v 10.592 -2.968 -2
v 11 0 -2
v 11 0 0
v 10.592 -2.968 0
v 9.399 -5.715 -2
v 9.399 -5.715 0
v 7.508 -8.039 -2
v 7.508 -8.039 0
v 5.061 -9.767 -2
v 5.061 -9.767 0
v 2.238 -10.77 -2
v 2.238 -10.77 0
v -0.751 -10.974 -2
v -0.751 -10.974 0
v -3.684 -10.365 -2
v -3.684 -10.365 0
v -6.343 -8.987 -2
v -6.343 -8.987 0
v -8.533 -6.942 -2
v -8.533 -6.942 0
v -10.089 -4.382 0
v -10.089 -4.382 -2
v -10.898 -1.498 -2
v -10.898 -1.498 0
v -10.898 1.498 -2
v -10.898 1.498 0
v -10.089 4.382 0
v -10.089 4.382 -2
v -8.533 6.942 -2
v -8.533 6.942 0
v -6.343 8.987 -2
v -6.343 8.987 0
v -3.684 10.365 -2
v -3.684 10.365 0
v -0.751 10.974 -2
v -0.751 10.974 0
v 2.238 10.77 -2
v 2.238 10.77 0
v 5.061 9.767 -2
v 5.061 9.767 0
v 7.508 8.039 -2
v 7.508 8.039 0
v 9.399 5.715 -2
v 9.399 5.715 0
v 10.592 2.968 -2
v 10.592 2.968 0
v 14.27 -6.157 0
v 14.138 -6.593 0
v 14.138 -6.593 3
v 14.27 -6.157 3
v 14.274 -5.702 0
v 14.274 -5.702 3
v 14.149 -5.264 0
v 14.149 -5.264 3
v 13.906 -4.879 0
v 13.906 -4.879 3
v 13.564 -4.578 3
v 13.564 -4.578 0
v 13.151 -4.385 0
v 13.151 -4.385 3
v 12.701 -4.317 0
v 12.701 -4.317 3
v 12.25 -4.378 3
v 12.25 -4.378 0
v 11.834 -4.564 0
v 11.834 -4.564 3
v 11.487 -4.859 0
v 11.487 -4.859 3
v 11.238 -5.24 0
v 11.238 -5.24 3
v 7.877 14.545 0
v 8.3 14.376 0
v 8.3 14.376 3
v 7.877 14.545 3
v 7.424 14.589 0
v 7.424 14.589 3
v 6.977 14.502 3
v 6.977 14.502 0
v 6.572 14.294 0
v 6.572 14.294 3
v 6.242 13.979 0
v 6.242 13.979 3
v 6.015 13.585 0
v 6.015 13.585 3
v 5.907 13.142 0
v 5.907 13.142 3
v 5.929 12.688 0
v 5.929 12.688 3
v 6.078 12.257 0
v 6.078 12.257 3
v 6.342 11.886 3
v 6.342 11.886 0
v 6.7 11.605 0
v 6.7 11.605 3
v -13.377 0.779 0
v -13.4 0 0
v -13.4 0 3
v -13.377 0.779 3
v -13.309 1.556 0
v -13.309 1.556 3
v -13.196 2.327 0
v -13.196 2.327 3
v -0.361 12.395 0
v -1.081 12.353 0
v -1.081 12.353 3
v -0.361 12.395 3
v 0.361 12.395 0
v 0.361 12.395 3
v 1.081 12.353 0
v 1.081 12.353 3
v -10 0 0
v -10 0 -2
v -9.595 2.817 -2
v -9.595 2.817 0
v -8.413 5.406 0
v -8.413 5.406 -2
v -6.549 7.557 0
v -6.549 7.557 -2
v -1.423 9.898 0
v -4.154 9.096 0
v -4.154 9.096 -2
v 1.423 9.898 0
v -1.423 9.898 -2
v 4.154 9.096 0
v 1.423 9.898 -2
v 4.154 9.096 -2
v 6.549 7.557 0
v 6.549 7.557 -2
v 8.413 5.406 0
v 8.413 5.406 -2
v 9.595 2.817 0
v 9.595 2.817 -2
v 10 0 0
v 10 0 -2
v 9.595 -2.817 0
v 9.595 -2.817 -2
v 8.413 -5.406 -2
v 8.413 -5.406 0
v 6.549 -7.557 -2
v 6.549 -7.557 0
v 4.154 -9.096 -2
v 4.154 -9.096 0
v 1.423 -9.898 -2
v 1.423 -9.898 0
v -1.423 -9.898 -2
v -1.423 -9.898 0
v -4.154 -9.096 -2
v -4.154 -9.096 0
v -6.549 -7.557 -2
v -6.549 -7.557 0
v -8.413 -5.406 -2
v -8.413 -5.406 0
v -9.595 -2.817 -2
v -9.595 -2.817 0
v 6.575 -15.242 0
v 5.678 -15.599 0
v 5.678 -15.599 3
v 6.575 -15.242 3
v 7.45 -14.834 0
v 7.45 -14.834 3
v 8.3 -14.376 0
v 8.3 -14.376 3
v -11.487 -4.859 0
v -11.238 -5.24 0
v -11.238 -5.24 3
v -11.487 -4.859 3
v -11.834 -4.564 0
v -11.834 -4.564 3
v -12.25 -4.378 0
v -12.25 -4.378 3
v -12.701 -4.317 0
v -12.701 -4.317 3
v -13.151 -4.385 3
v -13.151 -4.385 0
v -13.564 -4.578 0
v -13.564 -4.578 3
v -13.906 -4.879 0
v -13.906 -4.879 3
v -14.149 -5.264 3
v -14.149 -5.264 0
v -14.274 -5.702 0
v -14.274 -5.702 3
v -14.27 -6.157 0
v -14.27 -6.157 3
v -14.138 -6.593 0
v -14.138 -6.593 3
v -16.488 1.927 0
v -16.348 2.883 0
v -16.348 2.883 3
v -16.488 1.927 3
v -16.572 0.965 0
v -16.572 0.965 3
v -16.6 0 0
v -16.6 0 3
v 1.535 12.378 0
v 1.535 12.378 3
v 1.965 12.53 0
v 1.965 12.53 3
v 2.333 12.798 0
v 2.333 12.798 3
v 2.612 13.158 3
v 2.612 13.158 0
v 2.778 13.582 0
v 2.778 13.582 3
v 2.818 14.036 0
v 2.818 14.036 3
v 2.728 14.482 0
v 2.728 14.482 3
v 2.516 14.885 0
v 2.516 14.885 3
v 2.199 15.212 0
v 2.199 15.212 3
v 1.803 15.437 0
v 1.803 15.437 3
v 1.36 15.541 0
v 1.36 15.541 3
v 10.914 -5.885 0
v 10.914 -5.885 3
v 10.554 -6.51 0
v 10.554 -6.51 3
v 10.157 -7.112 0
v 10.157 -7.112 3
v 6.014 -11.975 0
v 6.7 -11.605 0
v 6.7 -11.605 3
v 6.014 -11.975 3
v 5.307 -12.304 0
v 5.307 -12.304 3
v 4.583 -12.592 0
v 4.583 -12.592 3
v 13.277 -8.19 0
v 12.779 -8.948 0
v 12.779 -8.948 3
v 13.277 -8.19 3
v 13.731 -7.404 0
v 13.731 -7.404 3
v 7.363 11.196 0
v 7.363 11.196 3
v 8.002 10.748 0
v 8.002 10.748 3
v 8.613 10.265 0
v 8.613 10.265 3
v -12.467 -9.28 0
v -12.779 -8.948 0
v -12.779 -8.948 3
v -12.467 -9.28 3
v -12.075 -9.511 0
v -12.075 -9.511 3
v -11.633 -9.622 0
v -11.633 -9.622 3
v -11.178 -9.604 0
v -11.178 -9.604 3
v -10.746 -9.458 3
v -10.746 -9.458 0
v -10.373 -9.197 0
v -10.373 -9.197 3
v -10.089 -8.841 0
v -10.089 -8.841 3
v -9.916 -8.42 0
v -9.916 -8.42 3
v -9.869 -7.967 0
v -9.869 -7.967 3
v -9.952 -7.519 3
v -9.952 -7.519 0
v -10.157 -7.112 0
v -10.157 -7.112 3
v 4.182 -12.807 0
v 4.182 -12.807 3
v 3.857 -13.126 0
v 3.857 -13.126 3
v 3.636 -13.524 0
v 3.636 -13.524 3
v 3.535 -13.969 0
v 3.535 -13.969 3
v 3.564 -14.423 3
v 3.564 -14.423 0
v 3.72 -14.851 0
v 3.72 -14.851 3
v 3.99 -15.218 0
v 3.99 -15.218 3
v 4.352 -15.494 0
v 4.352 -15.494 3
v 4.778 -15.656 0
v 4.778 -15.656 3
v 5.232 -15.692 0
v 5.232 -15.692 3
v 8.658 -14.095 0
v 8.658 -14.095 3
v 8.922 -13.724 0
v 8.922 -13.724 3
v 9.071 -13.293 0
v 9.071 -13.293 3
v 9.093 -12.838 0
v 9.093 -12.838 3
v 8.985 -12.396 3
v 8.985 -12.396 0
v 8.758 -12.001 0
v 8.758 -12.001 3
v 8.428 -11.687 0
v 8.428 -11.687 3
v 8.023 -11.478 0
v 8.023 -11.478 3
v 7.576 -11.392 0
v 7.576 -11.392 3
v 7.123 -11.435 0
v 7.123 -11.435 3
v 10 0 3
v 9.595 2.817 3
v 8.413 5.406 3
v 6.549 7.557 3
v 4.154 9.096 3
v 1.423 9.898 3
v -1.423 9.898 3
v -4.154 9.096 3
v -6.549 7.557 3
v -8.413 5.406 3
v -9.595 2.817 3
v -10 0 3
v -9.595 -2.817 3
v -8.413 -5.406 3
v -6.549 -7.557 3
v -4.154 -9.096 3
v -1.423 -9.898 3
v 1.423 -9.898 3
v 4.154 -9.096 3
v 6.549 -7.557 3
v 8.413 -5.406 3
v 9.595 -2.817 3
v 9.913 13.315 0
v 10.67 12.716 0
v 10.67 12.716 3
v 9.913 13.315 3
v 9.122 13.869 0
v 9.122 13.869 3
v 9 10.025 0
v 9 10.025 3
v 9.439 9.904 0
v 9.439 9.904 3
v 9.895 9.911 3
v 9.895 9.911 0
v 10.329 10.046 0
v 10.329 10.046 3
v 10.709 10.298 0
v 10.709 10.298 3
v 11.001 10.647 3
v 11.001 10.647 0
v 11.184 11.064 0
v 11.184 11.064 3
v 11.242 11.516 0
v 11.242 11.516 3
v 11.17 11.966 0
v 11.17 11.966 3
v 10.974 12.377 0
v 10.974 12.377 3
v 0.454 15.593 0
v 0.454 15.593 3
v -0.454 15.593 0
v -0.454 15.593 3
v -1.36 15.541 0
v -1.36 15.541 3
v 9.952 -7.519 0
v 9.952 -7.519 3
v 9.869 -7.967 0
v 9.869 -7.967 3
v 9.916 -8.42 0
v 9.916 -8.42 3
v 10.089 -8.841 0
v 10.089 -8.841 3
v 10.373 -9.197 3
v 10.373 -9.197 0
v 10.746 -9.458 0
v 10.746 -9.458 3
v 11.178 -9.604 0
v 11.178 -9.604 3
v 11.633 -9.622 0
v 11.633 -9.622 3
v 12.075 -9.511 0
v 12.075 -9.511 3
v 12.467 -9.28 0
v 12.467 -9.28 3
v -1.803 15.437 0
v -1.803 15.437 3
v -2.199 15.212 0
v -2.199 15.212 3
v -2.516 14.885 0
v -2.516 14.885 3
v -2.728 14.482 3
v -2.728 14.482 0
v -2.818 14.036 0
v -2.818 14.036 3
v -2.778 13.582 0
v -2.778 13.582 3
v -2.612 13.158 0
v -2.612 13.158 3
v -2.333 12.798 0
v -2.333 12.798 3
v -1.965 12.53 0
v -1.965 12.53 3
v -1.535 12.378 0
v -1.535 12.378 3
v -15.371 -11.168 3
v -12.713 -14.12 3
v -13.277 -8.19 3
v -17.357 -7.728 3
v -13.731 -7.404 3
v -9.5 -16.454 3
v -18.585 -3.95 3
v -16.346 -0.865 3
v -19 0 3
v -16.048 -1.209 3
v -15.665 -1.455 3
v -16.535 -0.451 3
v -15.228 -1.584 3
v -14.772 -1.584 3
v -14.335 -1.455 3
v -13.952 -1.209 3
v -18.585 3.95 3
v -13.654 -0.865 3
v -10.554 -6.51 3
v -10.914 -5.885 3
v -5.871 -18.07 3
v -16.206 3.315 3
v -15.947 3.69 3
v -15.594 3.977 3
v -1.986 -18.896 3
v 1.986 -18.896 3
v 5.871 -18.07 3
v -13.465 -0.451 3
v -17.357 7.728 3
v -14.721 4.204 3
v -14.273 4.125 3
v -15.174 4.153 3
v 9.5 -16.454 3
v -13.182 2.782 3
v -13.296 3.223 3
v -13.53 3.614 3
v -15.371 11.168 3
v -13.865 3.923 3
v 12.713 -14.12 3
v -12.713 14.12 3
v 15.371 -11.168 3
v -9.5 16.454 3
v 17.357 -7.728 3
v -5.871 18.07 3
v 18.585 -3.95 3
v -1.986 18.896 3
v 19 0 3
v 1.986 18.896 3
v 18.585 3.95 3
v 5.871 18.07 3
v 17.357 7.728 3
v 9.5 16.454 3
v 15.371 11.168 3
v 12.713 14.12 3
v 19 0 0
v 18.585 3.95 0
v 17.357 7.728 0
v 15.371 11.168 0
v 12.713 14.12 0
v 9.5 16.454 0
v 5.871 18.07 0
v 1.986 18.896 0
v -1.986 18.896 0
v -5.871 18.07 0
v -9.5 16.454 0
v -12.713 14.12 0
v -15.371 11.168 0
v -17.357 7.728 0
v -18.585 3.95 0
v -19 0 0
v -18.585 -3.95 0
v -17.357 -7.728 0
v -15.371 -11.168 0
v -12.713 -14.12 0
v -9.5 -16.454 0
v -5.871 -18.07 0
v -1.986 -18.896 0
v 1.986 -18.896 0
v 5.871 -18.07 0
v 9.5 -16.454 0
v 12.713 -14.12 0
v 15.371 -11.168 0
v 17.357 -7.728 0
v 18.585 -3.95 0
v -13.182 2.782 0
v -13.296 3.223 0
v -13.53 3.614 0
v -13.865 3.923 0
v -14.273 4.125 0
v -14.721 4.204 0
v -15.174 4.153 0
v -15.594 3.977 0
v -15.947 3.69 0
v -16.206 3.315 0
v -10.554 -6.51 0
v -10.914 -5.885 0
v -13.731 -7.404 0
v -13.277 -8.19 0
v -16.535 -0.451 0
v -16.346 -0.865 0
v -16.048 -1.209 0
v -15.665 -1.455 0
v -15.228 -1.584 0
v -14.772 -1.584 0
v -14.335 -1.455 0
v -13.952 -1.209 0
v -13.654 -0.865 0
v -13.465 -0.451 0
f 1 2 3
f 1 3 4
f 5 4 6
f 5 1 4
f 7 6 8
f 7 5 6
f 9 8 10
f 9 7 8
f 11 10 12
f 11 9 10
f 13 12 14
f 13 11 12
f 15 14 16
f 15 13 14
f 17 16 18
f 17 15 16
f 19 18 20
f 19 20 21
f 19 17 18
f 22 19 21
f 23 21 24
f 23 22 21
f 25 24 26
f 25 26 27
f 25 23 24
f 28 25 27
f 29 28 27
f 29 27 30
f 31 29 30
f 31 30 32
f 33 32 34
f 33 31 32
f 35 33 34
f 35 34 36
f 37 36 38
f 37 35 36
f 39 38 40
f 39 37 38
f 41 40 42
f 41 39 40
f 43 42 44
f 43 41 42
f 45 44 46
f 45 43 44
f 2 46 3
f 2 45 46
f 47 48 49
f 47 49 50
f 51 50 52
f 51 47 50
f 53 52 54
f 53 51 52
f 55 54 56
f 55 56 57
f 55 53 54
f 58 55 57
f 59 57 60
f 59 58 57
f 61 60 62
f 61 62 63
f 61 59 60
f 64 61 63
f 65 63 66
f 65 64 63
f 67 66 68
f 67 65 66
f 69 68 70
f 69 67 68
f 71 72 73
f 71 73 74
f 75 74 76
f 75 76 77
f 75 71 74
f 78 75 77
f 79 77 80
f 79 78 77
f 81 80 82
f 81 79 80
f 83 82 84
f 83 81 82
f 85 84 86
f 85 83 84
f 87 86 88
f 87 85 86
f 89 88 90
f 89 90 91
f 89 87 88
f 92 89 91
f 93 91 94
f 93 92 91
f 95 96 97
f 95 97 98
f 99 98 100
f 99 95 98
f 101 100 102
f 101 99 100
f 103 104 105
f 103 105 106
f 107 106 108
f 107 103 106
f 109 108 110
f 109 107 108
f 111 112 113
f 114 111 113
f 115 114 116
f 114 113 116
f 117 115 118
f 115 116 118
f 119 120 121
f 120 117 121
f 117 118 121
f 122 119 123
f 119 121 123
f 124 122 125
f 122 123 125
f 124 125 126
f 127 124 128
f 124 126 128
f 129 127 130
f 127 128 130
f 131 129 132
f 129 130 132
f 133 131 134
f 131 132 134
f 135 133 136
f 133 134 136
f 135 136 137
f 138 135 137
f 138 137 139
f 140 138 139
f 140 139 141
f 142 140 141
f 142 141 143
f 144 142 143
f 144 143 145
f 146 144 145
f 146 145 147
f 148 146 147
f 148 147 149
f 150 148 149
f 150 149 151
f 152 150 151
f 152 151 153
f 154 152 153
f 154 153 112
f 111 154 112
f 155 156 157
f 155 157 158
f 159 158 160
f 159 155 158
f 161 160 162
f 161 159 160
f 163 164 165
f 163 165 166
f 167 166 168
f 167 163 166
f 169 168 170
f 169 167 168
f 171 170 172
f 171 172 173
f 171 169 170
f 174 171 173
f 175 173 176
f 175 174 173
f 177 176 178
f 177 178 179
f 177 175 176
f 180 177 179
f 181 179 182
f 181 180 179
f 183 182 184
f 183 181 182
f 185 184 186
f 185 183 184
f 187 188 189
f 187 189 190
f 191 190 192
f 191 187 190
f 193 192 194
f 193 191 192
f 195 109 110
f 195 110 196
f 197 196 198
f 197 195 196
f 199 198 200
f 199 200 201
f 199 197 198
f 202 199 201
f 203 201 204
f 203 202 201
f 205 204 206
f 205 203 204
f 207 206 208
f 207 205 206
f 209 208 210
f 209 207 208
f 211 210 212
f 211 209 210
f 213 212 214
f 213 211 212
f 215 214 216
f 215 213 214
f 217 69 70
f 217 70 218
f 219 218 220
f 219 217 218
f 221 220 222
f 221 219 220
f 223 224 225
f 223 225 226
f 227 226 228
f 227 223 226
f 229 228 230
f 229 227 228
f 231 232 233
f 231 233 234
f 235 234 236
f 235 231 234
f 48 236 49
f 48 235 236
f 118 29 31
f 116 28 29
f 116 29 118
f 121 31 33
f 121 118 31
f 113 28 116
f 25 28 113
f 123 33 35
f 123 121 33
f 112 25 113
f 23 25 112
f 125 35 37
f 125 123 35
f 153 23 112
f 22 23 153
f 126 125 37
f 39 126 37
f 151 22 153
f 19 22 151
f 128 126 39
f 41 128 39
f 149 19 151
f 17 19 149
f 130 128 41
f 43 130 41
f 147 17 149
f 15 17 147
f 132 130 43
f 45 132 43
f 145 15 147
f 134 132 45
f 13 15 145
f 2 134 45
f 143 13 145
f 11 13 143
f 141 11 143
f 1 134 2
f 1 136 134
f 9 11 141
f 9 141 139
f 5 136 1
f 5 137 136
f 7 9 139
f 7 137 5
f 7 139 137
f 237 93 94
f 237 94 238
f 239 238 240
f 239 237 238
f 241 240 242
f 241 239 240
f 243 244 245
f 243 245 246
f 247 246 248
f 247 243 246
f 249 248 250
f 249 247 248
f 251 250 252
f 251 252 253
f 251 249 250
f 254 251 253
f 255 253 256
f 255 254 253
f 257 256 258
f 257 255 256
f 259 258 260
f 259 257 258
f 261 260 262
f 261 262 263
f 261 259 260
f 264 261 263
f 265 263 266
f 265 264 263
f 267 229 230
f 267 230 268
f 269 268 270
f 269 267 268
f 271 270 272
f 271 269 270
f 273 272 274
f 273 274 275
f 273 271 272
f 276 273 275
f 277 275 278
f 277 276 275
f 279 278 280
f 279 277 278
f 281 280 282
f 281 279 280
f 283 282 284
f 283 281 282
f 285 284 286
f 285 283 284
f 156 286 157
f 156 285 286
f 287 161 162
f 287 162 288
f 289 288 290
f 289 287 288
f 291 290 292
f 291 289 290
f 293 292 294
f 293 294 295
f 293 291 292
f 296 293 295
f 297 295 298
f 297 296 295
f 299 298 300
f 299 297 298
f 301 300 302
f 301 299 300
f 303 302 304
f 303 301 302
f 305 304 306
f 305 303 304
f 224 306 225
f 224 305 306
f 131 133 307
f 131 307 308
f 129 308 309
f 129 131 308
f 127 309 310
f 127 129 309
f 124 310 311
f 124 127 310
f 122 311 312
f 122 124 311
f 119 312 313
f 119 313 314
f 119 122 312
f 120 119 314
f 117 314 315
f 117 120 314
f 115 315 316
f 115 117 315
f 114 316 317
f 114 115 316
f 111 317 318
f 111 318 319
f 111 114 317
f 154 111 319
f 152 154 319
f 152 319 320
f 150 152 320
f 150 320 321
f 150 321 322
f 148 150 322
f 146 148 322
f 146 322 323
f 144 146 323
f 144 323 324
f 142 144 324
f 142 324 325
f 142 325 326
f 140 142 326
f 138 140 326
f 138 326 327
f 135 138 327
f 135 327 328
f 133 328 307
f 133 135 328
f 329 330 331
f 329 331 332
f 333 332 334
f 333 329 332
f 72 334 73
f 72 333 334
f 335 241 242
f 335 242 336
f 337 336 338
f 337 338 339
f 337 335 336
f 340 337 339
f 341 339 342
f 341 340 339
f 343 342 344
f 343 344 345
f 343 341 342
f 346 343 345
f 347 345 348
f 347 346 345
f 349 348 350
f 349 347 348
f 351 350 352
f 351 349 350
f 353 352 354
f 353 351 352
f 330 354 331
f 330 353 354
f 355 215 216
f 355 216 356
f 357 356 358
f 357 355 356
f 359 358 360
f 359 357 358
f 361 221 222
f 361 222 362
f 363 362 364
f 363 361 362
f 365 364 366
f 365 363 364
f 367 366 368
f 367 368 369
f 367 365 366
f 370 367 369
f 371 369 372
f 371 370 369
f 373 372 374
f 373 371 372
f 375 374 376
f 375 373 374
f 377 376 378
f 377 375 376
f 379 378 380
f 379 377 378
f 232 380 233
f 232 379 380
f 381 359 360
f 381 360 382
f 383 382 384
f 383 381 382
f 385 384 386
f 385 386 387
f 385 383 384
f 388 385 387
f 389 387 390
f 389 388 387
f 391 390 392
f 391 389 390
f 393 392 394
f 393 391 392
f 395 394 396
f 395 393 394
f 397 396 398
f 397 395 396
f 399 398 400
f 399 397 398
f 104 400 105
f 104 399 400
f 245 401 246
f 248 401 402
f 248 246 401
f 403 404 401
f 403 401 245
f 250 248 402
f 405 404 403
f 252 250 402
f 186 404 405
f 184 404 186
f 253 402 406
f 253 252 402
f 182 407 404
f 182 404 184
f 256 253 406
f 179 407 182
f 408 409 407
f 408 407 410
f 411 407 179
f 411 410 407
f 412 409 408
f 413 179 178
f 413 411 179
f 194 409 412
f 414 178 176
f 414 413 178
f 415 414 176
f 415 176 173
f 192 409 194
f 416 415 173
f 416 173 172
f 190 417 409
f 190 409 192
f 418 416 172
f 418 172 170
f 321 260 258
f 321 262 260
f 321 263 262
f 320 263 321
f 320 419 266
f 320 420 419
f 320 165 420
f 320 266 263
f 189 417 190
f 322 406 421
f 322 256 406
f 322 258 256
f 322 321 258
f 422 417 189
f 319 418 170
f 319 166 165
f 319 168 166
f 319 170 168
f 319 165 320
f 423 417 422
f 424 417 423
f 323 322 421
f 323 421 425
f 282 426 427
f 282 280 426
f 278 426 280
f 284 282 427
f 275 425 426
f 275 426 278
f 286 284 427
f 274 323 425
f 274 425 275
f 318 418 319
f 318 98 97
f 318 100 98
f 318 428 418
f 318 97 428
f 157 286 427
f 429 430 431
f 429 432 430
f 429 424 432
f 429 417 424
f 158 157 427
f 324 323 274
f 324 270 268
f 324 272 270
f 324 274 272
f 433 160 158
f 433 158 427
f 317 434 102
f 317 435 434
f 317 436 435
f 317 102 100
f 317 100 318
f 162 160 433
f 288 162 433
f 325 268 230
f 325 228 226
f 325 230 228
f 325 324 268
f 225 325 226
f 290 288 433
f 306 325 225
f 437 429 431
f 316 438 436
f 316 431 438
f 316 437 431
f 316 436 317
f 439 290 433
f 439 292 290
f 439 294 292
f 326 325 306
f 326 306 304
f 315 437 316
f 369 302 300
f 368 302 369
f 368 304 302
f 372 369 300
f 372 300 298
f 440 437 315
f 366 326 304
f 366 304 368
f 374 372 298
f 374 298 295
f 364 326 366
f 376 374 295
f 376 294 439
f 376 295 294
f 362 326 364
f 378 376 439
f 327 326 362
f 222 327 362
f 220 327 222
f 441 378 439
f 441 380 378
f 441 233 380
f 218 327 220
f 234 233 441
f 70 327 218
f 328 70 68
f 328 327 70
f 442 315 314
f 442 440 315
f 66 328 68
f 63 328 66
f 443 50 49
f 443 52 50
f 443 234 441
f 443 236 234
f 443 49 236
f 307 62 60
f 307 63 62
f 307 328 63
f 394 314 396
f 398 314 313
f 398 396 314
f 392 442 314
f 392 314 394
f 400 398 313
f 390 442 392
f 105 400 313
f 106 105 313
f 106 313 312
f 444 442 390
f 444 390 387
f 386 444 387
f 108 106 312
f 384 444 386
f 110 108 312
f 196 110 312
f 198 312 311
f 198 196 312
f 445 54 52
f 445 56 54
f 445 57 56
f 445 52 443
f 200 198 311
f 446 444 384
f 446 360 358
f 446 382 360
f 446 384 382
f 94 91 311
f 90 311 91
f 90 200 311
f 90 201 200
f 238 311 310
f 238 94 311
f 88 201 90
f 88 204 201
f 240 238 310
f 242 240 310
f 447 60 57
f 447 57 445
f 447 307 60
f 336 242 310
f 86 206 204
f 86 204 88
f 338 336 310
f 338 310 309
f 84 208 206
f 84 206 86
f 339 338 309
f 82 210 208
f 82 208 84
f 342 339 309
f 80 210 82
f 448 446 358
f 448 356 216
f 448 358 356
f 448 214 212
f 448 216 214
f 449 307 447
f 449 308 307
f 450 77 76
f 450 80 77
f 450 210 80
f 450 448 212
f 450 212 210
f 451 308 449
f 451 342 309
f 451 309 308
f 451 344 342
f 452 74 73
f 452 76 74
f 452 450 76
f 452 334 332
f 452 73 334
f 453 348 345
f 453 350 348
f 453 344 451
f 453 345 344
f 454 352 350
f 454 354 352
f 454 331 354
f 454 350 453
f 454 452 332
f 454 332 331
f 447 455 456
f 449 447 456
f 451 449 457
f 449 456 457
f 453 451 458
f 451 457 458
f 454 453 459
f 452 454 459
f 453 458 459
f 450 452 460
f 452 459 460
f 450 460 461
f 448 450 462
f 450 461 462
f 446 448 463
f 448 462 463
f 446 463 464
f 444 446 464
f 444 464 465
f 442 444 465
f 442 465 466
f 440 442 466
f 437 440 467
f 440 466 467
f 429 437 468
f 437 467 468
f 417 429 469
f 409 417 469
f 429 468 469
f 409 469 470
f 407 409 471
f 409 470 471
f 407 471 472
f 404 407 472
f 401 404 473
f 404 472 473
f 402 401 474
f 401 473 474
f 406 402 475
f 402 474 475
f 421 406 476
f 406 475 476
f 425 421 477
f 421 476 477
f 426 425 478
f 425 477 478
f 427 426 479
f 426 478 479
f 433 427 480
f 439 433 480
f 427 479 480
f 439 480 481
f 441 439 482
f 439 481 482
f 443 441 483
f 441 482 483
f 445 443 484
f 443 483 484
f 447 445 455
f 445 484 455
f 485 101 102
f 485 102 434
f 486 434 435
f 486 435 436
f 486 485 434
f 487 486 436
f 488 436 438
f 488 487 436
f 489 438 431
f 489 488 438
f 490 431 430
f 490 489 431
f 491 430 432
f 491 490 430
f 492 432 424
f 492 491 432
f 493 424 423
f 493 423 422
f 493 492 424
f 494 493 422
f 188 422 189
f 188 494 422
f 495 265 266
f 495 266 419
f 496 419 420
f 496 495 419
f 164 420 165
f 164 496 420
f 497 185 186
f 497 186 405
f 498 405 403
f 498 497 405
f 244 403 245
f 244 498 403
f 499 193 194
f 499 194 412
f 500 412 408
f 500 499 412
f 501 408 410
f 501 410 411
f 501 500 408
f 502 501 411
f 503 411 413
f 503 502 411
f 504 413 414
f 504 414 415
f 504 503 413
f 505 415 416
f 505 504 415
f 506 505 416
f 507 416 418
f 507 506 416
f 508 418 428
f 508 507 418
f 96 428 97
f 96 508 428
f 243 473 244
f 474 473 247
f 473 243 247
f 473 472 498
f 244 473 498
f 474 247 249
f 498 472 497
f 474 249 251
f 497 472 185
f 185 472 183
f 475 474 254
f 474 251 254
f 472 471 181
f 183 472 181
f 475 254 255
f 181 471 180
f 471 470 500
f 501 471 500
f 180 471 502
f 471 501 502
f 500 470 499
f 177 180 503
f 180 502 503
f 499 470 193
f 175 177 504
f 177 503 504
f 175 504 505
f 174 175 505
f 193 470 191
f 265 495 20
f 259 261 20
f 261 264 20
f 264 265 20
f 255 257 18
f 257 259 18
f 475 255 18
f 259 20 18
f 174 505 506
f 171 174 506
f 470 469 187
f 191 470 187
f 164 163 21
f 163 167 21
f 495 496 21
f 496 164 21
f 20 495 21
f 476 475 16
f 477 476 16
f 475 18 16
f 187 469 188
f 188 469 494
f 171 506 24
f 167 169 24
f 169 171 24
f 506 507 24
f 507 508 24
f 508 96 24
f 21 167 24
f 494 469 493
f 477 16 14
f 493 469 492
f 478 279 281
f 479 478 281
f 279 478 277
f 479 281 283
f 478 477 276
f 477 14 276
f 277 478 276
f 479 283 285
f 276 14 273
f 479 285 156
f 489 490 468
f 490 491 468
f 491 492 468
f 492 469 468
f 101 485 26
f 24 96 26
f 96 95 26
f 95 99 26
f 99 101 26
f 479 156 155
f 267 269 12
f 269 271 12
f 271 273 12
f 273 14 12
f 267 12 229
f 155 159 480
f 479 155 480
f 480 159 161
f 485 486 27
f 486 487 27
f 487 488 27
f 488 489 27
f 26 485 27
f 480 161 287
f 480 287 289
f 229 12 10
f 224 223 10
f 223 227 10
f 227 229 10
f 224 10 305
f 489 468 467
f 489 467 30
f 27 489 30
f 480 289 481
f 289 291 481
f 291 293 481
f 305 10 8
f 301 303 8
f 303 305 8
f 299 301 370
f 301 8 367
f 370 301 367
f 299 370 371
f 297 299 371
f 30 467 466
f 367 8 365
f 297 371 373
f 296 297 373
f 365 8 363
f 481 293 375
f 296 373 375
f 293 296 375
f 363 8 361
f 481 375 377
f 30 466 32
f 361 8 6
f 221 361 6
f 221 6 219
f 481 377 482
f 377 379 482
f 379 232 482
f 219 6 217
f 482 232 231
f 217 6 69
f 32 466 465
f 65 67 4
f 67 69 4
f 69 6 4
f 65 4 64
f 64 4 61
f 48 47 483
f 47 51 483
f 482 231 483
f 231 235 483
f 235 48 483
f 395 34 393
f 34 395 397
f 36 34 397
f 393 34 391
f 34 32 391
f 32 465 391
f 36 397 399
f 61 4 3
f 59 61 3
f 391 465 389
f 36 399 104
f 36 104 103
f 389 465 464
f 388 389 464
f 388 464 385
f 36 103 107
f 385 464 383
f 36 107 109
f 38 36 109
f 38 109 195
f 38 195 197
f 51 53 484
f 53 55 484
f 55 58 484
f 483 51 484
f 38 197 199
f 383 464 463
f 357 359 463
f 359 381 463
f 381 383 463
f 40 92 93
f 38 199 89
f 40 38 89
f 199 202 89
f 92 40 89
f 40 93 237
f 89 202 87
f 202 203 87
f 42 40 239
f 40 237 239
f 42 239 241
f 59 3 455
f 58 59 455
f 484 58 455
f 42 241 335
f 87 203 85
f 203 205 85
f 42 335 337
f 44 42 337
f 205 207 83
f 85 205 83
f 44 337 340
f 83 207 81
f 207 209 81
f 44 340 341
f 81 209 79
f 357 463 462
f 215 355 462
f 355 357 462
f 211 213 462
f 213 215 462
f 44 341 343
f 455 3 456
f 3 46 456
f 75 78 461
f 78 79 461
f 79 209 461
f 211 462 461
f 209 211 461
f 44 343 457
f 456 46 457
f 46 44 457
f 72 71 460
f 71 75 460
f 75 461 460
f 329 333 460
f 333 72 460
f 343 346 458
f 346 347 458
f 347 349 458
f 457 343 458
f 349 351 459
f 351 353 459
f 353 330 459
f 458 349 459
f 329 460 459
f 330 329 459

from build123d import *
from build123d.topology import SkipClean

# Parameters (mm, degrees)
SKETCH1_R           = 19
SKETCH1_R_2         = 10
BOSS_EXTRUDE1_DEPTH = 3
BOSS_EXTRUDE2_START = 2
SKETCH2_R           = 11
SKETCH2_R_2         = 10
BOSS_EXTRUDE2_DEPTH = 2


with BuildPart() as part:
    # Sketch1 → Boss-Extrude1 (new body)
    with BuildSketch(Plane.XY):
        Circle(SKETCH1_R)
        Circle(SKETCH1_R_2, mode=Mode.SUBTRACT)
        with BuildLine():
            ThreePointArc((1.359629587, 15.54063729), (0, 15.6), (-1.359629587, 15.54063729))
            ThreePointArc((-1.359629587, 15.54063729), (-2.814091915, 13.807276585), (-1.08073121, 12.352814256))
            ThreePointArc((-1.08073121, 12.352814256), (0, 12.4), (1.08073121, 12.352814256))
            ThreePointArc((1.08073121, 12.352814256), (2.814091915, 13.807276585), (1.359629587, 15.54063729))
        make_face(mode=Mode.SUBTRACT)
        with BuildLine():
            ThreePointArc((10.670274321, 12.716337756), (9.521368843, 13.597923935), (8.3, 14.376021703))
            ThreePointArc((8.3, 14.376021703), (6.114359354, 13.790381057), (6.7, 11.604740411))
            ThreePointArc((6.7, 11.604740411), (7.685924247, 10.976637393), (8.61335397, 10.264995538))
            ThreePointArc((8.61335397, 10.264995538), (10.867485254, 10.462206471), (10.670274321, 12.716337756))
        make_face(mode=Mode.SUBTRACT)
        with BuildLine():
            ThreePointArc((12.778771891, -8.947792407), (13.509996299, -7.8), (14.138401478, -6.592844883))
            ThreePointArc((14.138401478, -6.592844883), (13.364498237, -4.466563205), (11.238216559, -5.240466446))
            ThreePointArc((11.238216559, -5.240466446), (10.738715007, -6.2), (10.157485349, -7.112347811))
            ThreePointArc((10.157485349, -7.112347811), (10.550406322, -9.34071338), (12.778771891, -8.947792407))
        make_face(mode=Mode.SUBTRACT)
        with BuildLine():
            ThreePointArc((5.677534379, -15.598897505), (7.015463145, -15.044709265), (8.3, -14.376021703))
            ThreePointArc((8.3, -14.376021703), (8.885640646, -12.190381057), (6.7, -11.604740411))
            ThreePointArc((6.7, -11.604740411), (5.663084707, -12.144524346), (4.583069921, -12.591881119))
            ThreePointArc((4.583069921, -12.591881119), (3.626793957, -14.642621541), (5.677534379, -15.598897505))
        make_face(mode=Mode.SUBTRACT)
        with BuildLine():
            ThreePointArc((-14.138401478, -6.592844883), (-13.509996299, -7.8), (-12.778771891, -8.947792407))
            ThreePointArc((-12.778771891, -8.947792407), (-10.550406322, -9.34071338), (-10.157485349, -7.112347811))
            ThreePointArc((-10.157485349, -7.112347811), (-10.738715007, -6.2), (-11.238216559, -5.240466446))
            ThreePointArc((-11.238216559, -5.240466446), (-13.364498237, -4.466563205), (-14.138401478, -6.592844883))
        make_face(mode=Mode.SUBTRACT)
        with BuildLine():
            ThreePointArc((-16.3478087, 2.882559749), (-16.536831988, 1.44678533), (-16.6, 0))
            ThreePointArc((-16.6, 0), (-15, -1.6), (-13.4, 0))
            ThreePointArc((-13.4, 0), (-13.349008954, 1.167886953), (-13.19642389, 2.326885581))
            ThreePointArc((-13.19642389, 2.326885581), (-14.494279211, 4.18041507), (-16.3478087, 2.882559749))
        make_face(mode=Mode.SUBTRACT)
    extrude(amount=BOSS_EXTRUDE1_DEPTH)

    # Sketch2 → Boss-Extrude2 (add)
    with SkipClean():  # the faces are left unmerged after this step: merging them gives an invalid solid
        with BuildSketch(Plane(origin=(0, 0, 0), x_dir=(-1, 0, 0), z_dir=(0, 0, -1)).offset(BOSS_EXTRUDE2_START)):
            with Locations(Location((0, 0, 0), (0, 0, 180))):
                Circle(SKETCH2_R)
            Circle(SKETCH2_R_2, mode=Mode.SUBTRACT)
        extrude(amount=-BOSS_EXTRUDE2_DEPTH)


solid = part.part
